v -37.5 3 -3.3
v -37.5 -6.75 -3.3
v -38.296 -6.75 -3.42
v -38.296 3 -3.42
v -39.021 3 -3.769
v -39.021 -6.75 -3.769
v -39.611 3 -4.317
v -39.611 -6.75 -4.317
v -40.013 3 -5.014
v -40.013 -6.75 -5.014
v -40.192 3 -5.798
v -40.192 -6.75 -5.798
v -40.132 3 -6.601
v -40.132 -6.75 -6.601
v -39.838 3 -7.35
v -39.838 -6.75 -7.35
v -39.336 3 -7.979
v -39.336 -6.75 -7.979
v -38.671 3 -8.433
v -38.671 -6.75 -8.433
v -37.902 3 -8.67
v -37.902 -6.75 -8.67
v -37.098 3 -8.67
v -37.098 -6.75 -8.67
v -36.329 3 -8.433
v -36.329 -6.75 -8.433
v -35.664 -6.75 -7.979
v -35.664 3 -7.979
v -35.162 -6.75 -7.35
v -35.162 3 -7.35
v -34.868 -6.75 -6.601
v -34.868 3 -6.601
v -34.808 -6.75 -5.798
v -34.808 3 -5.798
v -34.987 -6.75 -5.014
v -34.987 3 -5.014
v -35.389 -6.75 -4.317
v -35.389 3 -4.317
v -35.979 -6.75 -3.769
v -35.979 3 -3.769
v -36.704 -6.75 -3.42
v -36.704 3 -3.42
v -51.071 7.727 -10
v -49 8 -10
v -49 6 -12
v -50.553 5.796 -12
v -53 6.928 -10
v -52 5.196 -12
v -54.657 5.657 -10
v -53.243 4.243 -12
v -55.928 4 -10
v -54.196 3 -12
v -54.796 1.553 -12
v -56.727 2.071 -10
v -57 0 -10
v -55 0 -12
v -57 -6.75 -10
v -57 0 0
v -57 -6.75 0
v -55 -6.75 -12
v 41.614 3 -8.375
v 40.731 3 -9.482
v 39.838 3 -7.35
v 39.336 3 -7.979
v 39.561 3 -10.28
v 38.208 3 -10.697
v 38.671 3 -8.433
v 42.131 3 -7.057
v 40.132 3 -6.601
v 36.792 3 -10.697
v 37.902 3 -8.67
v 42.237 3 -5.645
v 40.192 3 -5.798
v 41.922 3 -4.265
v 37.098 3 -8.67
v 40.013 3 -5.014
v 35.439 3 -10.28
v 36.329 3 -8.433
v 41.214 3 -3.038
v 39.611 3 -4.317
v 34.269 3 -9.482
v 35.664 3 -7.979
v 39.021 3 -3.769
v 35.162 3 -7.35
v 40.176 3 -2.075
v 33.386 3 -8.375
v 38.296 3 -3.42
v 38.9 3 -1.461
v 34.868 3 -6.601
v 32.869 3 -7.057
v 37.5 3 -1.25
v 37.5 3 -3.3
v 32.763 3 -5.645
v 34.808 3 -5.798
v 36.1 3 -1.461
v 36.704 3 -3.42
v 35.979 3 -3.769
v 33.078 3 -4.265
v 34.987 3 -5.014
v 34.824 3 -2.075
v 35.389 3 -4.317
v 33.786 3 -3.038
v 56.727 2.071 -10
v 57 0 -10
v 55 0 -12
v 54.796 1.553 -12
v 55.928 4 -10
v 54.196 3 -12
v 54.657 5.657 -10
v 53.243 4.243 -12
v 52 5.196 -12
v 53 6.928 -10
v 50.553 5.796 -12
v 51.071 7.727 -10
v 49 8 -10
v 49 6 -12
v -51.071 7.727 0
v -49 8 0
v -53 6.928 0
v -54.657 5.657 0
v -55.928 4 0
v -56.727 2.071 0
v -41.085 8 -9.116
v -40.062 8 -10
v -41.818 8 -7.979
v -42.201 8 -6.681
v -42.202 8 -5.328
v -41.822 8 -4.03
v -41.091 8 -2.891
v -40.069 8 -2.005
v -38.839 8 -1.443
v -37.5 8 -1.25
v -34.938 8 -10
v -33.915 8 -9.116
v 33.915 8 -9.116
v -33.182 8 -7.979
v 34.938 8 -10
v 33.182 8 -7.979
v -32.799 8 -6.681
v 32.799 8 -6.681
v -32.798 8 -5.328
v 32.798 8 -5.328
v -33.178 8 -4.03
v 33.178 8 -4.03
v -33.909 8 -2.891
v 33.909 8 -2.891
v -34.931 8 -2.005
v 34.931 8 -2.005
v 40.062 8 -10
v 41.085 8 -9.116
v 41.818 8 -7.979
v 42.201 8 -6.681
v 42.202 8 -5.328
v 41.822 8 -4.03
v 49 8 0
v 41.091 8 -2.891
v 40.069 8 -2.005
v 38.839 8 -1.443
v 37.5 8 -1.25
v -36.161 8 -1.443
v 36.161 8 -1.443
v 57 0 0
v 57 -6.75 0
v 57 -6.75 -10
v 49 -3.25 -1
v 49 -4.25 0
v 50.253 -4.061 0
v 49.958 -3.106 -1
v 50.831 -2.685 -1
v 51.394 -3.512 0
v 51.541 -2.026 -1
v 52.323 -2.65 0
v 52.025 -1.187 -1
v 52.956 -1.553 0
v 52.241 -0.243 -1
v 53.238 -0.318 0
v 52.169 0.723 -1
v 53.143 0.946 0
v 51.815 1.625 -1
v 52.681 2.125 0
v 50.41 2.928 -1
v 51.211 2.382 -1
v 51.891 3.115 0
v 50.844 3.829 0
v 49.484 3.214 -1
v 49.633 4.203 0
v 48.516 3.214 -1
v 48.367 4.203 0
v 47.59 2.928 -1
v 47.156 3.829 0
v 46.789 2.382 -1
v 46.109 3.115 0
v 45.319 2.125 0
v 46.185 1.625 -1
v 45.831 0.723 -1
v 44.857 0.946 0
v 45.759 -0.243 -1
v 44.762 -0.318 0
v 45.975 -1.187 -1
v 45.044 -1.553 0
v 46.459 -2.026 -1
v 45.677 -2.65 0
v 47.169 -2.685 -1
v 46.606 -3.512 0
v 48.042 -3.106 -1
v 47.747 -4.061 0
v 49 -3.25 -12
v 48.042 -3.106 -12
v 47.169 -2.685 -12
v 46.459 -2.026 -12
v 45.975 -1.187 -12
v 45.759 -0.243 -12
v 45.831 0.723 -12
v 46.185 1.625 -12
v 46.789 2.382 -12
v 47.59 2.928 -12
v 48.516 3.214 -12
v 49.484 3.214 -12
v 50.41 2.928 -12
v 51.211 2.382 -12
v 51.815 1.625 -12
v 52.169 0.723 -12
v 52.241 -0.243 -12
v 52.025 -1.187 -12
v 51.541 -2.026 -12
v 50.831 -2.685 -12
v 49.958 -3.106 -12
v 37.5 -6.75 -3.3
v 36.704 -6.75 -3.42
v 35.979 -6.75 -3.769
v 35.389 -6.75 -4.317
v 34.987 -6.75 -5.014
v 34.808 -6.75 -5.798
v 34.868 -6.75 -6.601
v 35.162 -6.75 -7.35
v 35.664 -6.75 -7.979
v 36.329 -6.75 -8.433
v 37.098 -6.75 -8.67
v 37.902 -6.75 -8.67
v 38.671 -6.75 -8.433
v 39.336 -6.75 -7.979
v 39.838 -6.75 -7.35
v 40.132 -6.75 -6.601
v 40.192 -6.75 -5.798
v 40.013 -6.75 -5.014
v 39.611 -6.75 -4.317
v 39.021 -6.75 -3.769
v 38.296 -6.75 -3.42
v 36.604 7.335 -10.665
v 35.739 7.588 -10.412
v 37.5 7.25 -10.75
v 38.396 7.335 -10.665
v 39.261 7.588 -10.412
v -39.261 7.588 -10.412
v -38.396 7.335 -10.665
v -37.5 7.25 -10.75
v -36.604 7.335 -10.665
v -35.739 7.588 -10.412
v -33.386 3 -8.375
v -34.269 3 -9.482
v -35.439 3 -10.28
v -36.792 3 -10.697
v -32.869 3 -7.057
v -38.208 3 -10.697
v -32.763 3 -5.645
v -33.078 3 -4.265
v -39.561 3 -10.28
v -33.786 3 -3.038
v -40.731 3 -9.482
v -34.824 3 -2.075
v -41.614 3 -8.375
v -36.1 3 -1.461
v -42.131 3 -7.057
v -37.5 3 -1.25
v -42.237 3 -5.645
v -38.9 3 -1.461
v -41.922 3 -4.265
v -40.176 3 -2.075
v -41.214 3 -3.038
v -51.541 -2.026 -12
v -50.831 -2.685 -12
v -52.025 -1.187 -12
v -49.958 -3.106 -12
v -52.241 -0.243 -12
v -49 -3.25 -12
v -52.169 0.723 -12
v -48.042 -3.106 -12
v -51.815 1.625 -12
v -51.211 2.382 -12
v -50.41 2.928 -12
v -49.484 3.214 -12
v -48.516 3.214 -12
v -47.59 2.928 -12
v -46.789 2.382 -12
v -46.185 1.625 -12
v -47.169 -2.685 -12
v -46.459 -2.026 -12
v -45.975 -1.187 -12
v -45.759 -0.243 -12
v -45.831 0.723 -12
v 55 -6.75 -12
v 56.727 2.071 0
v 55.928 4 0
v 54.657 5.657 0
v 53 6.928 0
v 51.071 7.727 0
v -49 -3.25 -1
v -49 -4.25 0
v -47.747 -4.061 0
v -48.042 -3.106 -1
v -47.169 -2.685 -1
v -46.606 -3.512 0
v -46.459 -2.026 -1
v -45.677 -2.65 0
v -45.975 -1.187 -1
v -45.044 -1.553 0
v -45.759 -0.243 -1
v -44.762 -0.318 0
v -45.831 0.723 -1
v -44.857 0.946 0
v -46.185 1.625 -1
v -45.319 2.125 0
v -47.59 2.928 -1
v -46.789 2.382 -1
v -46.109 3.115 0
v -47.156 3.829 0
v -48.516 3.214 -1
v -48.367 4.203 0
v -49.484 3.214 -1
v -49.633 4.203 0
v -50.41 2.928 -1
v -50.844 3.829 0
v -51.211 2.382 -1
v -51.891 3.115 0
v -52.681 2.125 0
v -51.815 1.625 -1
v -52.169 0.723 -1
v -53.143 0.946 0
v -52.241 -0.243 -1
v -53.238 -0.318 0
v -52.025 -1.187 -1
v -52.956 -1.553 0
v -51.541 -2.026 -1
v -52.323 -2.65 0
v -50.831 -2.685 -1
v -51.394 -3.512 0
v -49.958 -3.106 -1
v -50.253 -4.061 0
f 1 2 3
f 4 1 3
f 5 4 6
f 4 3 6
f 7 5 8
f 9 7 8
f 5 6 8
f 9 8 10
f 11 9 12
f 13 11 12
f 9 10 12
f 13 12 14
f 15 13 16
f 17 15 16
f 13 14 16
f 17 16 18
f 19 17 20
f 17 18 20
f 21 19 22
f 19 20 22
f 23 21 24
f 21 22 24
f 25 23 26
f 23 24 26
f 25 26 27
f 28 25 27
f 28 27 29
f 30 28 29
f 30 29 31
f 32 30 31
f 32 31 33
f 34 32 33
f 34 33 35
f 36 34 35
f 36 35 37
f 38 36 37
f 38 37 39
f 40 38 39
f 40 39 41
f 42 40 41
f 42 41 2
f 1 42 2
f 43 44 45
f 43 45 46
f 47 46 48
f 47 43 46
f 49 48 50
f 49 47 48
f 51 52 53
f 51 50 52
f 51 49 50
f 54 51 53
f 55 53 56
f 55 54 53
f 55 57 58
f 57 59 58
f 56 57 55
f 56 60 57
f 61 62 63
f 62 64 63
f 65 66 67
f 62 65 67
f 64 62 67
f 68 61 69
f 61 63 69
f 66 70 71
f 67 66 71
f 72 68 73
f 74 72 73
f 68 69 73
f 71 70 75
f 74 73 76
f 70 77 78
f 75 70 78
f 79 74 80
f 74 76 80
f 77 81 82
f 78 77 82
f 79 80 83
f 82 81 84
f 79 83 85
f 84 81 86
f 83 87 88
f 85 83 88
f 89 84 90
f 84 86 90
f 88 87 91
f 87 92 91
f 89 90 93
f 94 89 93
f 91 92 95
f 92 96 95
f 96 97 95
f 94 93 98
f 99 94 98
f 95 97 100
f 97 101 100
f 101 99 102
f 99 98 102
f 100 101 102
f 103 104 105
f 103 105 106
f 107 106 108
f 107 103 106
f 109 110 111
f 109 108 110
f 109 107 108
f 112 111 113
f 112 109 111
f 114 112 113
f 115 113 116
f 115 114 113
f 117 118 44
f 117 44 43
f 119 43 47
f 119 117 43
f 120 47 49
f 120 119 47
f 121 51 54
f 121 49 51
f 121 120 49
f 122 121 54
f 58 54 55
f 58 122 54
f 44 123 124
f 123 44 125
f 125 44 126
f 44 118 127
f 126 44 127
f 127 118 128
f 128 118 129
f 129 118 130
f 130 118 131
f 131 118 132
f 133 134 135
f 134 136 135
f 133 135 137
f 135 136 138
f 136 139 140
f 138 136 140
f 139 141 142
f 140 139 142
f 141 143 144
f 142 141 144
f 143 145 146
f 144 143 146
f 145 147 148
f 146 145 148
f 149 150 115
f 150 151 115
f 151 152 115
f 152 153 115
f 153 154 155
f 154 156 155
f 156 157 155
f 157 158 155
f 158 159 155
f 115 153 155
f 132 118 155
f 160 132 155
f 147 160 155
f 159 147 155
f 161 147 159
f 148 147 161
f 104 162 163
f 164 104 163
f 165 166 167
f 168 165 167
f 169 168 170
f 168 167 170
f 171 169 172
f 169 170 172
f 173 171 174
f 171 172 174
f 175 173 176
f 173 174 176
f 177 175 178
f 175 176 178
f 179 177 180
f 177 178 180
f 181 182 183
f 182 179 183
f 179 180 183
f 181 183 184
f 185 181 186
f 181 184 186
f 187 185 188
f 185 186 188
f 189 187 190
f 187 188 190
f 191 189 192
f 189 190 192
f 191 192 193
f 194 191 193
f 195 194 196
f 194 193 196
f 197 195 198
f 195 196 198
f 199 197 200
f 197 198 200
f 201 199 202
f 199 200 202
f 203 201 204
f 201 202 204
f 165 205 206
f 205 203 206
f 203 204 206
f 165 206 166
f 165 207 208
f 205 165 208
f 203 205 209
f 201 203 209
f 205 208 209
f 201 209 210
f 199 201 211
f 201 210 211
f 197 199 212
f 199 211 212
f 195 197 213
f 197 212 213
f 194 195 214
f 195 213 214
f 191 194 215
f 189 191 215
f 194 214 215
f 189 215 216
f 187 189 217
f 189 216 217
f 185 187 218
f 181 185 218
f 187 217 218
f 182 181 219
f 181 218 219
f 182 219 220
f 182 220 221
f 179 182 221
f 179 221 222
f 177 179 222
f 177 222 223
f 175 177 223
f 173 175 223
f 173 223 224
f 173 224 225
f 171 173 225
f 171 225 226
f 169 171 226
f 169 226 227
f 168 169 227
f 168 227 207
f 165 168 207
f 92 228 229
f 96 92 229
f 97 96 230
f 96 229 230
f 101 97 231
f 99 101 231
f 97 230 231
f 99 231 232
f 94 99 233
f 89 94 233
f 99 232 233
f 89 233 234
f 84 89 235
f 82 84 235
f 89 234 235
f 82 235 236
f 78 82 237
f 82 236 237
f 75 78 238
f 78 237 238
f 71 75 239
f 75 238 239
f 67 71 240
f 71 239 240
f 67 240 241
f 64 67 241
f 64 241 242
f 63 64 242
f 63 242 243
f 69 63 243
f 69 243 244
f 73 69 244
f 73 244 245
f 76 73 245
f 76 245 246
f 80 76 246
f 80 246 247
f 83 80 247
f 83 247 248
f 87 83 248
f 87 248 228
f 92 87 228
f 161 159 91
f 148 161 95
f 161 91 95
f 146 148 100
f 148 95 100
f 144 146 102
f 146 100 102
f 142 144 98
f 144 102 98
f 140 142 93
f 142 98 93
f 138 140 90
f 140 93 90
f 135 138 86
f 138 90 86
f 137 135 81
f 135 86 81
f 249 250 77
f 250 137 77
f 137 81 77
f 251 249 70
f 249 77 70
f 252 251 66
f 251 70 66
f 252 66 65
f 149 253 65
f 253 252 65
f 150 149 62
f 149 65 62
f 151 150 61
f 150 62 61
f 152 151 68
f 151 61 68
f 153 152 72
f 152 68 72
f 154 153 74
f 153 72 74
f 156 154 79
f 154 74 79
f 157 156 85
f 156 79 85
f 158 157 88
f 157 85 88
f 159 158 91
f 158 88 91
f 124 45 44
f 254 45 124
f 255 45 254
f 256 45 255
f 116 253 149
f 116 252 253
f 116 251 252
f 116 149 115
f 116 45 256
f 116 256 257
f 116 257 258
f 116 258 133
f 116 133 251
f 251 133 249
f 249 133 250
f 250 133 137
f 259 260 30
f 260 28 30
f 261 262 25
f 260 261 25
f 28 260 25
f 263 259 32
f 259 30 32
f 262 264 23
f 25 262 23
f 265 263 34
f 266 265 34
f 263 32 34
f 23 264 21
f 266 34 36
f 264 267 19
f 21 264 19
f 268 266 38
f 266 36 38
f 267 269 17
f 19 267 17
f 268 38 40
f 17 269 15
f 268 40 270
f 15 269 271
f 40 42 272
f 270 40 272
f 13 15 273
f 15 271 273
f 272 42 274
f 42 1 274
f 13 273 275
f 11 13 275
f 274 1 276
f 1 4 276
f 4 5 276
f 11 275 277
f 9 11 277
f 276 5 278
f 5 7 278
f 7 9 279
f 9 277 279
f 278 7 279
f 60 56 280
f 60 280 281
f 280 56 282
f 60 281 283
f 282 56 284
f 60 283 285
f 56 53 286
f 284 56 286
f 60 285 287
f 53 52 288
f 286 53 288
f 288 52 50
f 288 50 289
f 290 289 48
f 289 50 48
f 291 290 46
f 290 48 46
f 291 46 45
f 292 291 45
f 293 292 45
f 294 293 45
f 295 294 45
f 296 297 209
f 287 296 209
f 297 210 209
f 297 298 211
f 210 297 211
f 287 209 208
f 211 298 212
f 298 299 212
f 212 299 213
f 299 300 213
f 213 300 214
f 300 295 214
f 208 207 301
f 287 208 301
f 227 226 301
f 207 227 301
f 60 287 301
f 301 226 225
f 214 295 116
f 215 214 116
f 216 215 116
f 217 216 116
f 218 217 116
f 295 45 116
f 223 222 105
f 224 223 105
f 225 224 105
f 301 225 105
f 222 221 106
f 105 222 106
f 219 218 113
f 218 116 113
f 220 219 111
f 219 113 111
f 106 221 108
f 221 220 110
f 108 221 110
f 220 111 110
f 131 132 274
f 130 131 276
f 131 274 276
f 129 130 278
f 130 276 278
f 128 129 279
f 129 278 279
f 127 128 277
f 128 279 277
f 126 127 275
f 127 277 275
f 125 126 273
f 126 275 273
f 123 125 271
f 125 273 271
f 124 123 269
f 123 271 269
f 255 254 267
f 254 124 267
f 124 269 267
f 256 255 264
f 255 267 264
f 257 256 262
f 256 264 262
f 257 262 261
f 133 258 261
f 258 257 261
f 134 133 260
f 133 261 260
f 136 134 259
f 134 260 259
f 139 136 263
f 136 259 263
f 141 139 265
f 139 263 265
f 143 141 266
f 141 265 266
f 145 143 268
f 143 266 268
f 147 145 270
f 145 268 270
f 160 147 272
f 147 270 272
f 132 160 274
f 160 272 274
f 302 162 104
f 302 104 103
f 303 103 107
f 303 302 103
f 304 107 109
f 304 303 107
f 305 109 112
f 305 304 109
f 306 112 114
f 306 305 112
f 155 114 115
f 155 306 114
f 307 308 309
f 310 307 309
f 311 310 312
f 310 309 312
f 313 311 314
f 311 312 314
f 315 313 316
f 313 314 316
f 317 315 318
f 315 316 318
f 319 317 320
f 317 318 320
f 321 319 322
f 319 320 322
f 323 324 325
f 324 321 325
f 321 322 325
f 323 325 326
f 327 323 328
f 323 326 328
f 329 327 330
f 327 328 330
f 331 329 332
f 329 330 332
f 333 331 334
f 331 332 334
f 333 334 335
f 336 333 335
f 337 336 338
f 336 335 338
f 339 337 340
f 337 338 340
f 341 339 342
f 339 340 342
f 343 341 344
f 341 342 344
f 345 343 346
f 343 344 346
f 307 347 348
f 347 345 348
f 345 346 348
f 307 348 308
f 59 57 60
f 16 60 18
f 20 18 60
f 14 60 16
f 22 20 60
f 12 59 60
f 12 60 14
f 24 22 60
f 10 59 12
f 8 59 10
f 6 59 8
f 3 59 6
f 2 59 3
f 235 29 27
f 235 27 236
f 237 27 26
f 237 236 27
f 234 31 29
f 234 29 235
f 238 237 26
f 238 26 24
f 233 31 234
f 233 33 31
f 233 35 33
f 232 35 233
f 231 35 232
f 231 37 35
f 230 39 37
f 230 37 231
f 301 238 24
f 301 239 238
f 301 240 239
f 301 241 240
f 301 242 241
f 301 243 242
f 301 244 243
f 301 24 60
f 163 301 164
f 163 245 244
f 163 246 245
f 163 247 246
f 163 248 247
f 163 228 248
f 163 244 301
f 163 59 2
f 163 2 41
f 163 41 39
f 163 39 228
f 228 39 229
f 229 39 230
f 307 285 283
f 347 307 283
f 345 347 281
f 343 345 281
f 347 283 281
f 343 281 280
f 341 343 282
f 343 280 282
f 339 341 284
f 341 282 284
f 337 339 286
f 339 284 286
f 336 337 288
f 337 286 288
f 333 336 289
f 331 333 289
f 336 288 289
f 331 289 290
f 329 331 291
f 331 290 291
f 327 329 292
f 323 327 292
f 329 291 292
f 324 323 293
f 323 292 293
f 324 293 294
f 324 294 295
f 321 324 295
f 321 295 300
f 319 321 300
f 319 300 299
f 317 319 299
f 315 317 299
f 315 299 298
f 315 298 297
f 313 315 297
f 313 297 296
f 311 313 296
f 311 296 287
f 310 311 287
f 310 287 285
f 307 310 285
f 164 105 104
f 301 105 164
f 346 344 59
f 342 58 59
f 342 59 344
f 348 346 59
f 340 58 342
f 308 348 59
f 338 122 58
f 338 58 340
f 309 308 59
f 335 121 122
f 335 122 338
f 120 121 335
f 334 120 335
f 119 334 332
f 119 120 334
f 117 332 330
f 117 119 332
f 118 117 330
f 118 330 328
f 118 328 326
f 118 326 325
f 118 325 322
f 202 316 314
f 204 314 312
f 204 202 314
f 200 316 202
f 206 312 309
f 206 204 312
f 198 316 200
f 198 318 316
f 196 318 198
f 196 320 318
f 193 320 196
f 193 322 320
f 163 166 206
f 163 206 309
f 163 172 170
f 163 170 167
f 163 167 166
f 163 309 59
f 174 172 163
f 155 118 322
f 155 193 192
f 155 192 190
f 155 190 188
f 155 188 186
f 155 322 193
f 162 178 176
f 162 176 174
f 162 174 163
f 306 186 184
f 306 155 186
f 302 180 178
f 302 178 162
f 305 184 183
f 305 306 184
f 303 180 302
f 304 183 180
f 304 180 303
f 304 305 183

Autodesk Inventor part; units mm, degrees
ref_plane "YZ Plane" through (0, 0, 0) normal (1, 0, 0) x (0, 1, 0)
ref_plane "XZ Plane" through (0, 0, 0) normal (0, 1, 0) x (-1, 0, 0)
ref_plane "XY Plane" through (0, 0, 0) normal (0, 0, 1) x (1, 0, 0)
sketch "Sketch1" plane through (0, 0, 0) normal (0, 0, 1) x (1, 0, 0)
  line L0 (-49, 0) -> (49, 0) construction
  line L1 (-53.7631, 0) -> (-51.3816, 4.125)
  line L2 (-51.3816, 4.125) -> (-46.6184, 4.125)
  line L3 (-46.6184, 4.125) -> (-44.2369, 0)
  line L4 (-44.2369, 0) -> (-46.6184, -4.125)
  line L5 (-46.6184, -4.125) -> (-51.3816, -4.125)
  line L6 (-51.3816, -4.125) -> (-53.7631, 0)
  line L7 (53.7631, 0) -> (51.3816, -4.125)
  line L8 (51.3816, -4.125) -> (46.6184, -4.125)
  line L9 (46.6184, -4.125) -> (44.2369, 0)
  line L10 (44.2369, 0) -> (46.6184, 4.125)
  line L11 (46.6184, 4.125) -> (51.3816, 4.125)
  line L12 (51.3816, 4.125) -> (53.7631, 0)
  line L13 (57, -8) -> (-57, -8)
  line L14 (-57, -8) -> (-57, 8)
  line L15 (-57, 8) -> (57, 8)
  line L16 (57, 8) -> (57, -8)
  line L17 (57, -8) -> (-57, 8) construction
  line L18 (-57, -8) -> (57, 8) construction
  line L19 (-57, -6.75) -> (57, -6.75)
  circle A0 centre (-49, 0) radius 8
  circle A1 centre (49, 0) radius 8
  point P0 (0, 0)
  point P1 (0, 0)
  point P2 (49, 8)
  point P3 (-49, 8)
  point P4 (-57, 0)
  point P5 (57, 0)
  dimension "d0" = 98
  dimension "d1" = 8.25
  dimension "d2" = 16
  dimension "d3" = 8
  dimension "d4" = 8
  dimension "d34" = 6.75
extrude "Extrusion1" add sketch "Sketch1" against normal blind 12 contours L1 L2 L3 L4 L5 L6 | L7 L8 L9 L10 L11 L12 | L19 A1 L16 | A1 L19 | L19 A0 L15 A1 | A0 L19 | L19 L14 A0 picked at (48.2061, -5.875) picked at (-49.7939, -5.875)
chamfer "Chamfer2" distance 2 angle 45 5 edges at (0, 8, -12) (54.6569, 5.6569, -12) (57, -3.375, -12) (-54.6569, 5.6569, -12) (-57, -3.375, -12)
sketch "Sketch2" plane through (-49, 8, 0) normal (0, 1, 0) x (1, 0, 0)
  line L0 (11.5, 6) -> (86.5, 6) construction
  line L1 (98, 0) -> (0, 0) projected
  line L2 (98, 12) -> (0, 12) projected
  line L3 (49, 0) -> (49, 12) construction
  point P0 (49, 6)
  dimension "d14" = 75
hole "Hole1" at (-37.5, 8, -6) at (37.5, 8, -6) direction (0, -1, 0) diameter 5.4 end through all counterbore diameter 9.5 counterbore depth 5
sketch "Sketch3" plane through (0, 0, 0) normal (0, 0, 1) x (1, 0, 0)
  line L0 (-57, -6.75) -> (57, -6.75) projected
  arc A0 (-49, 8) -> (-57, 0) centre (-49, 0) ccw projected
  line L1 (-57, 0) -> (-57, -6.75) projected
  line L2 (57, -6.75) -> (57, 0) projected
  arc A1 (57, 0) -> (49, 8) centre (49, 0) ccw projected
  line L3 (49, 8) -> (-49, 8) projected
  point P0 (0, 0)
hole "Hole2" at (-49, 0, 0) at (49, 0, 0) direction (0, 0, -1) diameter 6.5 end through all
chamfer "Chamfer3" distance 1 angle 45 2 edges at (-49, 3.25, 0) (49, 3.25, 0)
equation "\"d4\" = d3"
properties part number "Front Panel Mount" material "ABS Plastic"
